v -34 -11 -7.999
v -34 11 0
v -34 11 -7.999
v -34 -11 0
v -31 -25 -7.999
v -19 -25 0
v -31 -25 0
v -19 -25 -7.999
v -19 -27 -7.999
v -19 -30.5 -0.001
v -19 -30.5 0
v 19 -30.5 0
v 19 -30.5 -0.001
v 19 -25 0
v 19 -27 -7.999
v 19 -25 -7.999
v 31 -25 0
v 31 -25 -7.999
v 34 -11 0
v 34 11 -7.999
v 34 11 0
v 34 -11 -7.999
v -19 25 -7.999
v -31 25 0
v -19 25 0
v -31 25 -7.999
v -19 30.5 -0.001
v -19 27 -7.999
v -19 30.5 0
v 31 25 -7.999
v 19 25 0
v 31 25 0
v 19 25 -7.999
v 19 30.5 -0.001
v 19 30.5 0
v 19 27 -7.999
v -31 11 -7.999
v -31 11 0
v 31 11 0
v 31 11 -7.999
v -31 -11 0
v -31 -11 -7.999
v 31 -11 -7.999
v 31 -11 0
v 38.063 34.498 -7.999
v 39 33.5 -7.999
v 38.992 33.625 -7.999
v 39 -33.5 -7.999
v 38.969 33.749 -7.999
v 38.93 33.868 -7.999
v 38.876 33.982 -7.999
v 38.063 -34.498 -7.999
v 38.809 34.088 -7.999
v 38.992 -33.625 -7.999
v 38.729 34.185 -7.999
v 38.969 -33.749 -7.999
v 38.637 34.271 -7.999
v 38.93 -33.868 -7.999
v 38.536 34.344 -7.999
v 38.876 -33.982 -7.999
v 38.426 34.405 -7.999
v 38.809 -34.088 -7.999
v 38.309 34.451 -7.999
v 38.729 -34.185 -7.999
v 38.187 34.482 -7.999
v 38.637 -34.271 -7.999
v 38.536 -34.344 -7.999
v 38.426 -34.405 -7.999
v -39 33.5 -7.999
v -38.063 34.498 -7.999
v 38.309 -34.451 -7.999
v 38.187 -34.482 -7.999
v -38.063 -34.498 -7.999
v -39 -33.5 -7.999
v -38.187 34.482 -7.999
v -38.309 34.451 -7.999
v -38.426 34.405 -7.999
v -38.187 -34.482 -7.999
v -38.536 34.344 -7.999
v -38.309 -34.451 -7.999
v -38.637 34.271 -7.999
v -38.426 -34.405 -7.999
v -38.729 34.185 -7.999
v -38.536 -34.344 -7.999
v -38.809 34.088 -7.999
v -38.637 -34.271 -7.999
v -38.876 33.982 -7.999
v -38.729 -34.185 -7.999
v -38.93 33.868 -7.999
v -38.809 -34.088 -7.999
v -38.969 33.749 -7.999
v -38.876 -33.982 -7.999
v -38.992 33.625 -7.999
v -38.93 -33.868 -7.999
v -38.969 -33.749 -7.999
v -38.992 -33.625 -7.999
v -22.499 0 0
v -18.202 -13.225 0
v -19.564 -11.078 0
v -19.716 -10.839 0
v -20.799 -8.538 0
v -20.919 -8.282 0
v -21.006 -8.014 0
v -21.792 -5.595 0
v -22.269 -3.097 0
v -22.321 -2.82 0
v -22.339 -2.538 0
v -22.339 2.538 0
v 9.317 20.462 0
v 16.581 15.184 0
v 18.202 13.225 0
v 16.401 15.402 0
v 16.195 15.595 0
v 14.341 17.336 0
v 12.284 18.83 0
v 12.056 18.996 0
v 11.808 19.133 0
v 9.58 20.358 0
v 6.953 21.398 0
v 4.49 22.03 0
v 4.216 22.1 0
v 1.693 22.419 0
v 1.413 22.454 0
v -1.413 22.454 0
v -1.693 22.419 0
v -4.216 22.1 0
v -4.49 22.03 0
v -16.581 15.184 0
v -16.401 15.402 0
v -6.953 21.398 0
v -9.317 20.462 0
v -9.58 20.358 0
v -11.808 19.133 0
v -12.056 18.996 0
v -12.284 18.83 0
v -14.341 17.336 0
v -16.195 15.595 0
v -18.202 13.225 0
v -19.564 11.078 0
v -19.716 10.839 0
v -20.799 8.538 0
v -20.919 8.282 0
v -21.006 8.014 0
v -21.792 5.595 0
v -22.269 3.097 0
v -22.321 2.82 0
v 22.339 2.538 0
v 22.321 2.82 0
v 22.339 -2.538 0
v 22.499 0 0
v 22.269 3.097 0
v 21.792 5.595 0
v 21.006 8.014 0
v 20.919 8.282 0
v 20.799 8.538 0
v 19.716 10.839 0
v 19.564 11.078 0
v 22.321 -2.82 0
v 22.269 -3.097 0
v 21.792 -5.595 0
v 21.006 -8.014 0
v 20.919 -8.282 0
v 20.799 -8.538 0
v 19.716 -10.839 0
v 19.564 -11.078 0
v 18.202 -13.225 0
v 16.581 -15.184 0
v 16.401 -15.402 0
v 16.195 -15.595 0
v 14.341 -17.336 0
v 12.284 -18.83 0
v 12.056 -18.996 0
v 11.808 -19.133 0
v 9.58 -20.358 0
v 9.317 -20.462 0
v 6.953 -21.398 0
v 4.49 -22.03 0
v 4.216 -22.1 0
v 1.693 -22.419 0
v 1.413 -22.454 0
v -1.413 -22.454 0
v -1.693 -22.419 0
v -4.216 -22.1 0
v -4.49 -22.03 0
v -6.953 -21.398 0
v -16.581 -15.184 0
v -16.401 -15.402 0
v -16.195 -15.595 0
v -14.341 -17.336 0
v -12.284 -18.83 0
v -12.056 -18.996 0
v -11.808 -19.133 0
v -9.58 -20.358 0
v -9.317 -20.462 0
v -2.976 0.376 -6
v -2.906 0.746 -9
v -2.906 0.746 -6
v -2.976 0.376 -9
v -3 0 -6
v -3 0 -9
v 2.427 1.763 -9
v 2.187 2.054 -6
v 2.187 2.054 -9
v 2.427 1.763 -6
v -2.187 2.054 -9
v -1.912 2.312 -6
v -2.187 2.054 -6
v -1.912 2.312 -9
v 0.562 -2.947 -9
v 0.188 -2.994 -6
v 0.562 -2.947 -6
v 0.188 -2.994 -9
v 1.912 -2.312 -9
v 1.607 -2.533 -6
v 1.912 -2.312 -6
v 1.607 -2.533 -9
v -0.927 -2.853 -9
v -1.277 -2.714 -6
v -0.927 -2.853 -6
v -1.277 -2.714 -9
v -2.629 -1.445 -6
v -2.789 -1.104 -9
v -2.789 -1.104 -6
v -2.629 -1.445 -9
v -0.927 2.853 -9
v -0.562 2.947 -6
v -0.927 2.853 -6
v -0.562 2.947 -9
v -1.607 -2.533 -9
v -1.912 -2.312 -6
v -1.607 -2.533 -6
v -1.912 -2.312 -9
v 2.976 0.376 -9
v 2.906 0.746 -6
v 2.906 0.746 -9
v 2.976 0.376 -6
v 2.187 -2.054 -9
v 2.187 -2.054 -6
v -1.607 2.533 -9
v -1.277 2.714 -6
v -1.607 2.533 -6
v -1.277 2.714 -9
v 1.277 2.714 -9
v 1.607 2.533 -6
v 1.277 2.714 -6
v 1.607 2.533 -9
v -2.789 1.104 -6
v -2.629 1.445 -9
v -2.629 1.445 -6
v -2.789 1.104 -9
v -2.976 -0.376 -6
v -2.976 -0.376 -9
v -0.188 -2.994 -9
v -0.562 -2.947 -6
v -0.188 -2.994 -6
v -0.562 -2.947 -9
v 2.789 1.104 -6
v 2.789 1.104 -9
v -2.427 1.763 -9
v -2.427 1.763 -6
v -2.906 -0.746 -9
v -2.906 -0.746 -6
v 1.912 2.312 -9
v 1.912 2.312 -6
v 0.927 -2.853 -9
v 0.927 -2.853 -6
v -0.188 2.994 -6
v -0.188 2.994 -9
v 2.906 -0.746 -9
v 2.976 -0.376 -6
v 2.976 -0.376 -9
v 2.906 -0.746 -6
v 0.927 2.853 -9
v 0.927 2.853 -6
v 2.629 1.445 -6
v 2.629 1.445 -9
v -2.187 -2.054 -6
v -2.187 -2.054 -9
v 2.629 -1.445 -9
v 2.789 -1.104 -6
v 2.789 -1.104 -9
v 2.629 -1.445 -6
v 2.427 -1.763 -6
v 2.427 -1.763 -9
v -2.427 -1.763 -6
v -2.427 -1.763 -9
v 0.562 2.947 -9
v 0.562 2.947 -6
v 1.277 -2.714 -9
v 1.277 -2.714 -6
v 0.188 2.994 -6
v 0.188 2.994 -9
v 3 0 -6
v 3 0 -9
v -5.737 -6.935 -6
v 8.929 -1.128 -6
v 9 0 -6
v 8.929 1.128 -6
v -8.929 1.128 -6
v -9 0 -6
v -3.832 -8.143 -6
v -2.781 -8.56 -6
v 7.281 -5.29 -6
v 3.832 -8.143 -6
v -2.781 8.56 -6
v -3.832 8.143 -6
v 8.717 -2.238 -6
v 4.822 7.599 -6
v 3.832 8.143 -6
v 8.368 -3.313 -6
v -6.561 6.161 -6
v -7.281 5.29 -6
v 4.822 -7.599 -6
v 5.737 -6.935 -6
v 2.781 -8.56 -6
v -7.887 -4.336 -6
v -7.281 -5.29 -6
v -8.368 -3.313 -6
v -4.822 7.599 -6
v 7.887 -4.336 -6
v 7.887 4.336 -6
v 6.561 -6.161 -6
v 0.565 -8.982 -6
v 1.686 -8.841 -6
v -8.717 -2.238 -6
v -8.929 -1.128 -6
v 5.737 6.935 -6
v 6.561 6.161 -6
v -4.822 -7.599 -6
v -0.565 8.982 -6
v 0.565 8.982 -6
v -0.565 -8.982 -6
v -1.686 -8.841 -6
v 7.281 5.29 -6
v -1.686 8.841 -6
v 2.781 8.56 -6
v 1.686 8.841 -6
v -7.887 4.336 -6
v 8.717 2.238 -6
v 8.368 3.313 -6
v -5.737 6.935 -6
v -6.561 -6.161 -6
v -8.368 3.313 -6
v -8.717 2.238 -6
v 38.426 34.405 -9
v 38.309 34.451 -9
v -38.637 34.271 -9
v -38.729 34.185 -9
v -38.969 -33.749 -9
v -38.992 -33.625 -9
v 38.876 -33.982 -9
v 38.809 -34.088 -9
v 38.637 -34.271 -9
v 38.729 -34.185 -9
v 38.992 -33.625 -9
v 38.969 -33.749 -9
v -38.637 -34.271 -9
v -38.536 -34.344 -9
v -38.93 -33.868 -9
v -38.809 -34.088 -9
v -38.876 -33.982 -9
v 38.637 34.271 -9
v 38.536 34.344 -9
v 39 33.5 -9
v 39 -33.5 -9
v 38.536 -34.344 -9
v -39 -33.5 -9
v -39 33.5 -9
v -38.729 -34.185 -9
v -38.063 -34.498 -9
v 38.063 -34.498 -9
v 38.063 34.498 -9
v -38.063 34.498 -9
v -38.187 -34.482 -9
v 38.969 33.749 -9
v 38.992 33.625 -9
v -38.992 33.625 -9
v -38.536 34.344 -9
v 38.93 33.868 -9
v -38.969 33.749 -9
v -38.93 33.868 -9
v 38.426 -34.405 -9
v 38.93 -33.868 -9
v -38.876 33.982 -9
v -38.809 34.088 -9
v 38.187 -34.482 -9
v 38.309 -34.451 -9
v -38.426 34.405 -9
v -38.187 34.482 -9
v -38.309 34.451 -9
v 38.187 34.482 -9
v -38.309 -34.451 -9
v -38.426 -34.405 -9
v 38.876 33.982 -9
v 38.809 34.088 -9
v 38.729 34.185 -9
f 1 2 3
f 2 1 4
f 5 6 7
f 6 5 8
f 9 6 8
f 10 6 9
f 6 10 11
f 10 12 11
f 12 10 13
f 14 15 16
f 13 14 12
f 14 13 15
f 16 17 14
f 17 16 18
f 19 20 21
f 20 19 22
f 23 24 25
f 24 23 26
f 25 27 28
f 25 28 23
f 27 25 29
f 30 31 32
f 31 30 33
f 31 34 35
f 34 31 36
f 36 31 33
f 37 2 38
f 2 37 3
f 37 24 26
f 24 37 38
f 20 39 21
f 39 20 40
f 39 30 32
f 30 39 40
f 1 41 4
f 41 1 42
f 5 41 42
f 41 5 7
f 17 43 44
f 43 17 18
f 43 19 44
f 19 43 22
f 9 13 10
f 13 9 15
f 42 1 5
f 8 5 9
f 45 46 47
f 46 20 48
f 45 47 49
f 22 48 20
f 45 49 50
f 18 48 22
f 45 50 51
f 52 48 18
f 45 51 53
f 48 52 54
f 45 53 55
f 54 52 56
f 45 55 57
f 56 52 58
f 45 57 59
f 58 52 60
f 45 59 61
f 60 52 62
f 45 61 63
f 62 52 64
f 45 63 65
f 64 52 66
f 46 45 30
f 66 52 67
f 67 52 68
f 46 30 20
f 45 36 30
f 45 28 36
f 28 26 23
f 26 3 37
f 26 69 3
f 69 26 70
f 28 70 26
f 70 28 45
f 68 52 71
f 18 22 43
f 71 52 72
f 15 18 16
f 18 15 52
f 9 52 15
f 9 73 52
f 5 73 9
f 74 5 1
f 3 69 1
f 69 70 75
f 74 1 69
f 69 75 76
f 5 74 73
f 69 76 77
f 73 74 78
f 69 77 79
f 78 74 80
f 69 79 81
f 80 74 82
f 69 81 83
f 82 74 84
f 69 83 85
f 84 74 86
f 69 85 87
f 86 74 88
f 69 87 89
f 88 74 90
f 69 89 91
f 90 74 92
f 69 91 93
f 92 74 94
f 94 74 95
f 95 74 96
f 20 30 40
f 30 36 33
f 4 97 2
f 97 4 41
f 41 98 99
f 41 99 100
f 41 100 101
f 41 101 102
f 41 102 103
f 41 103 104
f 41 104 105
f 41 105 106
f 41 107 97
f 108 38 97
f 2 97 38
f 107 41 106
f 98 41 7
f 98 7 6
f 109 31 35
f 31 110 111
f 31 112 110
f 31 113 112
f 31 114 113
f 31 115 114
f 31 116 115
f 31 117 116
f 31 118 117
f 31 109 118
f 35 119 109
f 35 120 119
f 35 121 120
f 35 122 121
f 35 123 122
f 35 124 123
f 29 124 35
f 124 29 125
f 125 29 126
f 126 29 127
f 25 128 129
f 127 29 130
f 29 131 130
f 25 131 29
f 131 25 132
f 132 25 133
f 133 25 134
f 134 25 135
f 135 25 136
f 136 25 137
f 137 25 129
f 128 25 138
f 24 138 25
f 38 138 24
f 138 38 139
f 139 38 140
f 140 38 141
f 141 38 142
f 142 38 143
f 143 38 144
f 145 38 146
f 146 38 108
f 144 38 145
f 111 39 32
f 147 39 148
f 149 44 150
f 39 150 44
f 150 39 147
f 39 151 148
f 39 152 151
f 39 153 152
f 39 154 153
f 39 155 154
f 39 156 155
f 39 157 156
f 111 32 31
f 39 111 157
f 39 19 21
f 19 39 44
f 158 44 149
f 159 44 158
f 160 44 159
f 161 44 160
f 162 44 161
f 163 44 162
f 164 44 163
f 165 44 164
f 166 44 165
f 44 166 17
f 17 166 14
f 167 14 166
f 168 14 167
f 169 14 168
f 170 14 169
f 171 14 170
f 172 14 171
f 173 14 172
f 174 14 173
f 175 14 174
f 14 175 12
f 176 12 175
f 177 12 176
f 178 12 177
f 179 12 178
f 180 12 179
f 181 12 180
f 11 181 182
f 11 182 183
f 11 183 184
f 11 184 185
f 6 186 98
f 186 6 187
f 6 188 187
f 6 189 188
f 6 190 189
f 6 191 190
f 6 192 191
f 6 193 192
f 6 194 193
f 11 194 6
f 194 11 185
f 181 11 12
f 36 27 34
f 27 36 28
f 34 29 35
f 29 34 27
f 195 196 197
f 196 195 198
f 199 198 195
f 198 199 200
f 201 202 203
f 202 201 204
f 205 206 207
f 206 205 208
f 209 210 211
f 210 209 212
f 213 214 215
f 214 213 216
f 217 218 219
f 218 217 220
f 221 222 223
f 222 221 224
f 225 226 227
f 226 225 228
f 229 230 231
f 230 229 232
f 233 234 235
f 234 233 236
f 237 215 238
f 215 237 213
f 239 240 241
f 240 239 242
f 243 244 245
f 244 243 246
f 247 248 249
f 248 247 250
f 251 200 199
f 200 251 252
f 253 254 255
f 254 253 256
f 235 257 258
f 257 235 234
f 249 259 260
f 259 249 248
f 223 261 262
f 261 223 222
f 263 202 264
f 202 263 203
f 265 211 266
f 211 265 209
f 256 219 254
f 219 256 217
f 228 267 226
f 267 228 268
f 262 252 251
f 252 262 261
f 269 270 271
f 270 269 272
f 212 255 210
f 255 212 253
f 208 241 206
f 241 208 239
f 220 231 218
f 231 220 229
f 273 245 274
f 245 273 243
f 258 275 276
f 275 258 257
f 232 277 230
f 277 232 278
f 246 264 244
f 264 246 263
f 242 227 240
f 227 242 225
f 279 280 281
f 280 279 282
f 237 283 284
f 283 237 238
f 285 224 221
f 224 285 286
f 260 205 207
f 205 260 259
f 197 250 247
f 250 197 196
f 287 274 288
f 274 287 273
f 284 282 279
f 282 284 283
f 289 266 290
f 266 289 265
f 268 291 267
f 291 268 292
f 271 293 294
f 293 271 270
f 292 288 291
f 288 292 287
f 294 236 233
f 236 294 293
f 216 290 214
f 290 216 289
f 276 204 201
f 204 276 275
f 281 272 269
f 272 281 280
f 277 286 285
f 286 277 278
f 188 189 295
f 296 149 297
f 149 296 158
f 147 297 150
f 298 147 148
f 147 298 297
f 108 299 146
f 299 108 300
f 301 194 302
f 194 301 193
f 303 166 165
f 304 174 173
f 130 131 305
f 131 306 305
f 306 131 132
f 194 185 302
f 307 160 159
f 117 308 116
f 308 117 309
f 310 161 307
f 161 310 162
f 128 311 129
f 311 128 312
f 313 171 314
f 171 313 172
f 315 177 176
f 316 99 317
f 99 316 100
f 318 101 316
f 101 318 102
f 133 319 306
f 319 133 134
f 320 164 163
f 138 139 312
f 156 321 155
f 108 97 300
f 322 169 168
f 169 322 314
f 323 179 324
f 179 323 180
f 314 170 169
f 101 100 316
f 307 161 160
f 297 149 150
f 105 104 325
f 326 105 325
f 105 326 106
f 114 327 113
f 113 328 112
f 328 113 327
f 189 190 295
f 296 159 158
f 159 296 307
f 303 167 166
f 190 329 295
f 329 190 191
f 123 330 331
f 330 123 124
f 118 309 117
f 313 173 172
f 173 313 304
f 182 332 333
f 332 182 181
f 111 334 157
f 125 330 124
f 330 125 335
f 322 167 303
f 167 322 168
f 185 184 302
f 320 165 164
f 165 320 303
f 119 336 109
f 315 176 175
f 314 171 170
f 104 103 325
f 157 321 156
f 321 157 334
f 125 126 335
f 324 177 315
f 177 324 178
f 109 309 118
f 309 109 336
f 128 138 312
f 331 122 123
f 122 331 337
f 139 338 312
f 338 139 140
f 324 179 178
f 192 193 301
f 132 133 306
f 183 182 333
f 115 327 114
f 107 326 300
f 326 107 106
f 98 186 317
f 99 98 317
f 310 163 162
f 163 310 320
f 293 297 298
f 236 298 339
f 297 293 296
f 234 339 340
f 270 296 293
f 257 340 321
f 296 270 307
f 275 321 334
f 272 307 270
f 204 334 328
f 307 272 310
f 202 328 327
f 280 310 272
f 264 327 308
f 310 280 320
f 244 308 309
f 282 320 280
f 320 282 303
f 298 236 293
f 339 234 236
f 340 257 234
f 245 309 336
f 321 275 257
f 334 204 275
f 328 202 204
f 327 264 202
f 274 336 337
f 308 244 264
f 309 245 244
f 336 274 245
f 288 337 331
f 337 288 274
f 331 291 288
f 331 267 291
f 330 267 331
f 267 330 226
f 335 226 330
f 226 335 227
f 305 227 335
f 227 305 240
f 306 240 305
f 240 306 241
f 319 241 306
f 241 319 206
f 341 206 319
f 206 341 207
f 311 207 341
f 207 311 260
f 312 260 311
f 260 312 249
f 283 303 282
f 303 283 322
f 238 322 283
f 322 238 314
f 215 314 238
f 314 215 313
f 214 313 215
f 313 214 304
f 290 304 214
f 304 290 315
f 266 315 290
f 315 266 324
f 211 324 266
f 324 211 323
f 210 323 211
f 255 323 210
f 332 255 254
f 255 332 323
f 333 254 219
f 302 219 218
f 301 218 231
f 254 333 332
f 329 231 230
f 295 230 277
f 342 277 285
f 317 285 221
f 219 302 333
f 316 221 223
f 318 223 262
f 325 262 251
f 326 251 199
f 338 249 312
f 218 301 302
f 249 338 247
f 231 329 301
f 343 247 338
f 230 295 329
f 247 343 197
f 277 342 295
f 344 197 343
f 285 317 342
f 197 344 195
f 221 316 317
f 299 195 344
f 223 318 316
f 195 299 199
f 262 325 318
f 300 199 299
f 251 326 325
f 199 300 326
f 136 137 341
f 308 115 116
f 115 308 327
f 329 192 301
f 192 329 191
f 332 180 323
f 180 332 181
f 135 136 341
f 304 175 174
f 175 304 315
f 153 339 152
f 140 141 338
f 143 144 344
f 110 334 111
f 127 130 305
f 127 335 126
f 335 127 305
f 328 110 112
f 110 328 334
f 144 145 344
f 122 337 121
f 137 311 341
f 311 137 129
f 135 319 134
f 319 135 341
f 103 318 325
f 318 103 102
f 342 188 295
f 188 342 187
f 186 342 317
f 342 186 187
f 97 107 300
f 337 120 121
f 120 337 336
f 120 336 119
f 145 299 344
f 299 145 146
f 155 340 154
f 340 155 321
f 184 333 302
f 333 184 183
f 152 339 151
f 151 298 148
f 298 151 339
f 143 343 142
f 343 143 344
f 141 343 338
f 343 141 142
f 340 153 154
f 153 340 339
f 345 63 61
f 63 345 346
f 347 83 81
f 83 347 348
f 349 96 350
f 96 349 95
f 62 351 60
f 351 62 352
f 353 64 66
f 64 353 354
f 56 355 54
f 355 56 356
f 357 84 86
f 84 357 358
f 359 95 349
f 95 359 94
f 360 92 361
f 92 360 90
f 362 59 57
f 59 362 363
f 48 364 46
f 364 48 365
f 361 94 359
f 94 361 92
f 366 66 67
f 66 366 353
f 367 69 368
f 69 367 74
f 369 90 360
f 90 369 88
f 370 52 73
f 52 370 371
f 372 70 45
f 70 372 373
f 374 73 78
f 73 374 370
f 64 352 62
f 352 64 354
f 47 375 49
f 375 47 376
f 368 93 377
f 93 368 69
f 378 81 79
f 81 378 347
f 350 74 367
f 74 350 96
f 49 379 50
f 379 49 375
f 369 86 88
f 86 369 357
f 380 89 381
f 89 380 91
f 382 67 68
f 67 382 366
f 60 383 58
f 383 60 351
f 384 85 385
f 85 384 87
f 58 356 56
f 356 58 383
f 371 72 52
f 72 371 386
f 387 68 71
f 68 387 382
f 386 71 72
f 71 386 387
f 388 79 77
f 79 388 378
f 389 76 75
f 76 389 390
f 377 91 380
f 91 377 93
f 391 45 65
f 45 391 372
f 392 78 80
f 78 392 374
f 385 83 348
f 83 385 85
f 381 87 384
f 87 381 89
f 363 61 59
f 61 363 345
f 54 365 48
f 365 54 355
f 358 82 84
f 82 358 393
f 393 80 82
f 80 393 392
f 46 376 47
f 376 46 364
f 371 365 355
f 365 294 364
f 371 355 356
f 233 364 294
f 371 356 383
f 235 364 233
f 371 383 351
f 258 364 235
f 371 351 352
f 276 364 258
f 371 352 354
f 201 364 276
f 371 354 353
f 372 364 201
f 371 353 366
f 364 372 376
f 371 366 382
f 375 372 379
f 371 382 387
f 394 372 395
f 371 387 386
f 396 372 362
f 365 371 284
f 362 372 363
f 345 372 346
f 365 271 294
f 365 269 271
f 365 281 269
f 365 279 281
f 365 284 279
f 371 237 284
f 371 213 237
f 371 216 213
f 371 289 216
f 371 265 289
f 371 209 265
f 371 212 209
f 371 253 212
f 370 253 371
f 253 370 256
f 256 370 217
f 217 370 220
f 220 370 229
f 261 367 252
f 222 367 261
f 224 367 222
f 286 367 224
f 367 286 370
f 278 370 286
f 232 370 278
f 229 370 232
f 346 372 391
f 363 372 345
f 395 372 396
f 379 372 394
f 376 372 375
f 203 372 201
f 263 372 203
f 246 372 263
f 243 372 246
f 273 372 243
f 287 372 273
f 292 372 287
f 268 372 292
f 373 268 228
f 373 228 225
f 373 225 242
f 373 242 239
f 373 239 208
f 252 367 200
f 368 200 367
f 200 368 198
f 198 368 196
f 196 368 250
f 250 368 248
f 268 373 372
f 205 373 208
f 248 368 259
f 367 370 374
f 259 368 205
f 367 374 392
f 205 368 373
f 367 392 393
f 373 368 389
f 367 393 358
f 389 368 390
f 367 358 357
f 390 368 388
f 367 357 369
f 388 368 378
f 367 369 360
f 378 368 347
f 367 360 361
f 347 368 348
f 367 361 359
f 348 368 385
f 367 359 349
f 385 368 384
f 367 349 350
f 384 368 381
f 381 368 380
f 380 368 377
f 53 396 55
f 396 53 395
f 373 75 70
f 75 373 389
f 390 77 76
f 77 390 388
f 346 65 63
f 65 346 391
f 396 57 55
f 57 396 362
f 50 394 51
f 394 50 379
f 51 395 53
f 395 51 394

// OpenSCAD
//How wide the clip part is flat side to flat side
ShoeBottomWidth = 68;
// The widest part of the angle
ShoeBottomLength = 61; 
//How wide the clip part is flat side to flat side
ShoeTopWidth = 68;
// The narrowest part of the angle
ShoeTopLength = 54; 
// How tall the shoe part is
ShoeDepth = 8;

// How long any 'keying' is on the front/back face of the shoe
FrontDetentLength = 15;
// How wide any 'keying' is on the front/back face of the shoe
FrontDetentWidth = 2;

// How long any 'keying' is on the side of the shoe
SideDetentLength = 16;
// How wide any 'keying' is on the side of the shoe
SideDetentWidth = 3;

TopPlateWidth = 78;
TopPlateLength = 69;
TopPlateDepth = 1;

$fn=50 + 0;

rotate(a=[0,180,0])
{
	difference()
	{
		shoe();
		shoekeys();
		cylinder(h = ShoeDepth, r=3);
		rotate(a=[0,180,0]) translate([0,0,2-ShoeDepth]) cylinder(h = ShoeDepth, r1 = 9, r2 = min(ShoeBottomWidth, ShoeBottomLength, ShoeTopWidth, ShoeTopLength) * .5);
	
	}
	
	// Face Plate
	difference()
	{
		minkowski()
		{
			translate([0,0, ShoeDepth]) cube(size = [TopPlateWidth - TopPlateDepth- TopPlateDepth,TopPlateLength - TopPlateDepth - TopPlateDepth,.001], center = true);
		 	cylinder(r=TopPlateDepth,h=TopPlateDepth);
		}
		translate([0,0, TopPlateDepth * 2]) cylinder(h = ShoeDepth, r=3);
	}
}



module shoe() {
	hull() {
		translate([0,0, .001]) cube(size = [ShoeBottomWidth,ShoeBottomLength,.001], center = true);
 		translate([0,0,ShoeDepth-.001]) cube(size = [ShoeTopWidth,ShoeTopLength,.001], center = true);
	}
}

module shoekeys()
{

	//Front and back keys
	hull()
	{	
		translate([(ShoeTopWidth * .5) - FrontDetentLength, (ShoeTopLength * .5) - ShoeTopLength, 0]) cube(size = [FrontDetentLength,FrontDetentWidth,ShoeDepth], center = false);
		translate([(ShoeBottomWidth * .5) - FrontDetentLength, -(ShoeBottomLength * .5) , 0]) cube(size = [FrontDetentLength,FrontDetentWidth,ShoeDepth], center = false);
	}
	hull()
	{	
		translate([-(ShoeTopWidth * .5) , (ShoeTopLength * .5) - ShoeTopLength, 0]) cube(size = [FrontDetentLength,FrontDetentWidth,ShoeDepth], center = false);
		translate([-(ShoeBottomWidth * .5) , -(ShoeBottomLength * .5) , 0]) cube(size = [FrontDetentLength,FrontDetentWidth,ShoeDepth], center = false);
	}

	hull()
	{	
		translate([(ShoeTopWidth * .5) - FrontDetentLength, (ShoeTopLength * .5) -FrontDetentWidth, 0]) cube(size = [FrontDetentLength,FrontDetentWidth,ShoeDepth], center = false);
		translate([(ShoeBottomWidth * .5) - FrontDetentLength, (ShoeBottomLength * .5) , 0]) cube(size = [FrontDetentLength,FrontDetentWidth,ShoeDepth], center = false);
	}
	hull()
	{	
		translate([-(ShoeTopWidth * .5) , (ShoeTopLength * .5) -FrontDetentWidth, 0]) cube(size = [FrontDetentLength,FrontDetentWidth,ShoeDepth], center = false);
		translate([-(ShoeBottomWidth * .5) , (ShoeBottomLength * .5) , 0]) cube(size = [FrontDetentLength,FrontDetentWidth,ShoeDepth], center = false);
	}

	// Side Keys
	hull()
	{
		translate([(ShoeTopWidth * .5) - SideDetentWidth , (ShoeTopLength * .5) - SideDetentLength, 0]) cube(size = [SideDetentWidth,SideDetentLength,ShoeDepth], center = false);
		translate([(ShoeBottomWidth * .5) - SideDetentWidth , (ShoeBottomLength * .5) - SideDetentLength, 0]) cube(size = [SideDetentWidth,SideDetentLength,ShoeDepth], center = false);
	}
	hull()
	{
	translate([-(ShoeTopWidth * .5)  , (ShoeTopLength * .5) - SideDetentLength, 0]) cube(size = [SideDetentWidth,SideDetentLength,ShoeDepth], center = false);
		translate([-(ShoeBottomWidth * .5)  , (ShoeBottomLength * .5) - SideDetentLength, 0]) cube(size = [SideDetentWidth,SideDetentLength,ShoeDepth], center = false);
	}
	hull()
	{
		translate([(ShoeTopWidth * .5) - SideDetentWidth , -(ShoeTopLength * .5), 0]) cube(size = [SideDetentWidth,SideDetentLength,ShoeDepth], center = false);
		translate([(ShoeBottomWidth * .5) - SideDetentWidth , -(ShoeBottomLength * .5), 0]) cube(size = [SideDetentWidth,SideDetentLength,ShoeDepth], center = false);
	}
	hull()
	{
	translate([-(ShoeTopWidth * .5)  , -(ShoeTopLength * .5) , 0]) cube(size = [SideDetentWidth,SideDetentLength,ShoeDepth], center = false);
		translate([-(ShoeBottomWidth * .5)  , -(ShoeBottomLength * .5) , 0]) cube(size = [SideDetentWidth,SideDetentLength,ShoeDepth], center = false);
	}
}
